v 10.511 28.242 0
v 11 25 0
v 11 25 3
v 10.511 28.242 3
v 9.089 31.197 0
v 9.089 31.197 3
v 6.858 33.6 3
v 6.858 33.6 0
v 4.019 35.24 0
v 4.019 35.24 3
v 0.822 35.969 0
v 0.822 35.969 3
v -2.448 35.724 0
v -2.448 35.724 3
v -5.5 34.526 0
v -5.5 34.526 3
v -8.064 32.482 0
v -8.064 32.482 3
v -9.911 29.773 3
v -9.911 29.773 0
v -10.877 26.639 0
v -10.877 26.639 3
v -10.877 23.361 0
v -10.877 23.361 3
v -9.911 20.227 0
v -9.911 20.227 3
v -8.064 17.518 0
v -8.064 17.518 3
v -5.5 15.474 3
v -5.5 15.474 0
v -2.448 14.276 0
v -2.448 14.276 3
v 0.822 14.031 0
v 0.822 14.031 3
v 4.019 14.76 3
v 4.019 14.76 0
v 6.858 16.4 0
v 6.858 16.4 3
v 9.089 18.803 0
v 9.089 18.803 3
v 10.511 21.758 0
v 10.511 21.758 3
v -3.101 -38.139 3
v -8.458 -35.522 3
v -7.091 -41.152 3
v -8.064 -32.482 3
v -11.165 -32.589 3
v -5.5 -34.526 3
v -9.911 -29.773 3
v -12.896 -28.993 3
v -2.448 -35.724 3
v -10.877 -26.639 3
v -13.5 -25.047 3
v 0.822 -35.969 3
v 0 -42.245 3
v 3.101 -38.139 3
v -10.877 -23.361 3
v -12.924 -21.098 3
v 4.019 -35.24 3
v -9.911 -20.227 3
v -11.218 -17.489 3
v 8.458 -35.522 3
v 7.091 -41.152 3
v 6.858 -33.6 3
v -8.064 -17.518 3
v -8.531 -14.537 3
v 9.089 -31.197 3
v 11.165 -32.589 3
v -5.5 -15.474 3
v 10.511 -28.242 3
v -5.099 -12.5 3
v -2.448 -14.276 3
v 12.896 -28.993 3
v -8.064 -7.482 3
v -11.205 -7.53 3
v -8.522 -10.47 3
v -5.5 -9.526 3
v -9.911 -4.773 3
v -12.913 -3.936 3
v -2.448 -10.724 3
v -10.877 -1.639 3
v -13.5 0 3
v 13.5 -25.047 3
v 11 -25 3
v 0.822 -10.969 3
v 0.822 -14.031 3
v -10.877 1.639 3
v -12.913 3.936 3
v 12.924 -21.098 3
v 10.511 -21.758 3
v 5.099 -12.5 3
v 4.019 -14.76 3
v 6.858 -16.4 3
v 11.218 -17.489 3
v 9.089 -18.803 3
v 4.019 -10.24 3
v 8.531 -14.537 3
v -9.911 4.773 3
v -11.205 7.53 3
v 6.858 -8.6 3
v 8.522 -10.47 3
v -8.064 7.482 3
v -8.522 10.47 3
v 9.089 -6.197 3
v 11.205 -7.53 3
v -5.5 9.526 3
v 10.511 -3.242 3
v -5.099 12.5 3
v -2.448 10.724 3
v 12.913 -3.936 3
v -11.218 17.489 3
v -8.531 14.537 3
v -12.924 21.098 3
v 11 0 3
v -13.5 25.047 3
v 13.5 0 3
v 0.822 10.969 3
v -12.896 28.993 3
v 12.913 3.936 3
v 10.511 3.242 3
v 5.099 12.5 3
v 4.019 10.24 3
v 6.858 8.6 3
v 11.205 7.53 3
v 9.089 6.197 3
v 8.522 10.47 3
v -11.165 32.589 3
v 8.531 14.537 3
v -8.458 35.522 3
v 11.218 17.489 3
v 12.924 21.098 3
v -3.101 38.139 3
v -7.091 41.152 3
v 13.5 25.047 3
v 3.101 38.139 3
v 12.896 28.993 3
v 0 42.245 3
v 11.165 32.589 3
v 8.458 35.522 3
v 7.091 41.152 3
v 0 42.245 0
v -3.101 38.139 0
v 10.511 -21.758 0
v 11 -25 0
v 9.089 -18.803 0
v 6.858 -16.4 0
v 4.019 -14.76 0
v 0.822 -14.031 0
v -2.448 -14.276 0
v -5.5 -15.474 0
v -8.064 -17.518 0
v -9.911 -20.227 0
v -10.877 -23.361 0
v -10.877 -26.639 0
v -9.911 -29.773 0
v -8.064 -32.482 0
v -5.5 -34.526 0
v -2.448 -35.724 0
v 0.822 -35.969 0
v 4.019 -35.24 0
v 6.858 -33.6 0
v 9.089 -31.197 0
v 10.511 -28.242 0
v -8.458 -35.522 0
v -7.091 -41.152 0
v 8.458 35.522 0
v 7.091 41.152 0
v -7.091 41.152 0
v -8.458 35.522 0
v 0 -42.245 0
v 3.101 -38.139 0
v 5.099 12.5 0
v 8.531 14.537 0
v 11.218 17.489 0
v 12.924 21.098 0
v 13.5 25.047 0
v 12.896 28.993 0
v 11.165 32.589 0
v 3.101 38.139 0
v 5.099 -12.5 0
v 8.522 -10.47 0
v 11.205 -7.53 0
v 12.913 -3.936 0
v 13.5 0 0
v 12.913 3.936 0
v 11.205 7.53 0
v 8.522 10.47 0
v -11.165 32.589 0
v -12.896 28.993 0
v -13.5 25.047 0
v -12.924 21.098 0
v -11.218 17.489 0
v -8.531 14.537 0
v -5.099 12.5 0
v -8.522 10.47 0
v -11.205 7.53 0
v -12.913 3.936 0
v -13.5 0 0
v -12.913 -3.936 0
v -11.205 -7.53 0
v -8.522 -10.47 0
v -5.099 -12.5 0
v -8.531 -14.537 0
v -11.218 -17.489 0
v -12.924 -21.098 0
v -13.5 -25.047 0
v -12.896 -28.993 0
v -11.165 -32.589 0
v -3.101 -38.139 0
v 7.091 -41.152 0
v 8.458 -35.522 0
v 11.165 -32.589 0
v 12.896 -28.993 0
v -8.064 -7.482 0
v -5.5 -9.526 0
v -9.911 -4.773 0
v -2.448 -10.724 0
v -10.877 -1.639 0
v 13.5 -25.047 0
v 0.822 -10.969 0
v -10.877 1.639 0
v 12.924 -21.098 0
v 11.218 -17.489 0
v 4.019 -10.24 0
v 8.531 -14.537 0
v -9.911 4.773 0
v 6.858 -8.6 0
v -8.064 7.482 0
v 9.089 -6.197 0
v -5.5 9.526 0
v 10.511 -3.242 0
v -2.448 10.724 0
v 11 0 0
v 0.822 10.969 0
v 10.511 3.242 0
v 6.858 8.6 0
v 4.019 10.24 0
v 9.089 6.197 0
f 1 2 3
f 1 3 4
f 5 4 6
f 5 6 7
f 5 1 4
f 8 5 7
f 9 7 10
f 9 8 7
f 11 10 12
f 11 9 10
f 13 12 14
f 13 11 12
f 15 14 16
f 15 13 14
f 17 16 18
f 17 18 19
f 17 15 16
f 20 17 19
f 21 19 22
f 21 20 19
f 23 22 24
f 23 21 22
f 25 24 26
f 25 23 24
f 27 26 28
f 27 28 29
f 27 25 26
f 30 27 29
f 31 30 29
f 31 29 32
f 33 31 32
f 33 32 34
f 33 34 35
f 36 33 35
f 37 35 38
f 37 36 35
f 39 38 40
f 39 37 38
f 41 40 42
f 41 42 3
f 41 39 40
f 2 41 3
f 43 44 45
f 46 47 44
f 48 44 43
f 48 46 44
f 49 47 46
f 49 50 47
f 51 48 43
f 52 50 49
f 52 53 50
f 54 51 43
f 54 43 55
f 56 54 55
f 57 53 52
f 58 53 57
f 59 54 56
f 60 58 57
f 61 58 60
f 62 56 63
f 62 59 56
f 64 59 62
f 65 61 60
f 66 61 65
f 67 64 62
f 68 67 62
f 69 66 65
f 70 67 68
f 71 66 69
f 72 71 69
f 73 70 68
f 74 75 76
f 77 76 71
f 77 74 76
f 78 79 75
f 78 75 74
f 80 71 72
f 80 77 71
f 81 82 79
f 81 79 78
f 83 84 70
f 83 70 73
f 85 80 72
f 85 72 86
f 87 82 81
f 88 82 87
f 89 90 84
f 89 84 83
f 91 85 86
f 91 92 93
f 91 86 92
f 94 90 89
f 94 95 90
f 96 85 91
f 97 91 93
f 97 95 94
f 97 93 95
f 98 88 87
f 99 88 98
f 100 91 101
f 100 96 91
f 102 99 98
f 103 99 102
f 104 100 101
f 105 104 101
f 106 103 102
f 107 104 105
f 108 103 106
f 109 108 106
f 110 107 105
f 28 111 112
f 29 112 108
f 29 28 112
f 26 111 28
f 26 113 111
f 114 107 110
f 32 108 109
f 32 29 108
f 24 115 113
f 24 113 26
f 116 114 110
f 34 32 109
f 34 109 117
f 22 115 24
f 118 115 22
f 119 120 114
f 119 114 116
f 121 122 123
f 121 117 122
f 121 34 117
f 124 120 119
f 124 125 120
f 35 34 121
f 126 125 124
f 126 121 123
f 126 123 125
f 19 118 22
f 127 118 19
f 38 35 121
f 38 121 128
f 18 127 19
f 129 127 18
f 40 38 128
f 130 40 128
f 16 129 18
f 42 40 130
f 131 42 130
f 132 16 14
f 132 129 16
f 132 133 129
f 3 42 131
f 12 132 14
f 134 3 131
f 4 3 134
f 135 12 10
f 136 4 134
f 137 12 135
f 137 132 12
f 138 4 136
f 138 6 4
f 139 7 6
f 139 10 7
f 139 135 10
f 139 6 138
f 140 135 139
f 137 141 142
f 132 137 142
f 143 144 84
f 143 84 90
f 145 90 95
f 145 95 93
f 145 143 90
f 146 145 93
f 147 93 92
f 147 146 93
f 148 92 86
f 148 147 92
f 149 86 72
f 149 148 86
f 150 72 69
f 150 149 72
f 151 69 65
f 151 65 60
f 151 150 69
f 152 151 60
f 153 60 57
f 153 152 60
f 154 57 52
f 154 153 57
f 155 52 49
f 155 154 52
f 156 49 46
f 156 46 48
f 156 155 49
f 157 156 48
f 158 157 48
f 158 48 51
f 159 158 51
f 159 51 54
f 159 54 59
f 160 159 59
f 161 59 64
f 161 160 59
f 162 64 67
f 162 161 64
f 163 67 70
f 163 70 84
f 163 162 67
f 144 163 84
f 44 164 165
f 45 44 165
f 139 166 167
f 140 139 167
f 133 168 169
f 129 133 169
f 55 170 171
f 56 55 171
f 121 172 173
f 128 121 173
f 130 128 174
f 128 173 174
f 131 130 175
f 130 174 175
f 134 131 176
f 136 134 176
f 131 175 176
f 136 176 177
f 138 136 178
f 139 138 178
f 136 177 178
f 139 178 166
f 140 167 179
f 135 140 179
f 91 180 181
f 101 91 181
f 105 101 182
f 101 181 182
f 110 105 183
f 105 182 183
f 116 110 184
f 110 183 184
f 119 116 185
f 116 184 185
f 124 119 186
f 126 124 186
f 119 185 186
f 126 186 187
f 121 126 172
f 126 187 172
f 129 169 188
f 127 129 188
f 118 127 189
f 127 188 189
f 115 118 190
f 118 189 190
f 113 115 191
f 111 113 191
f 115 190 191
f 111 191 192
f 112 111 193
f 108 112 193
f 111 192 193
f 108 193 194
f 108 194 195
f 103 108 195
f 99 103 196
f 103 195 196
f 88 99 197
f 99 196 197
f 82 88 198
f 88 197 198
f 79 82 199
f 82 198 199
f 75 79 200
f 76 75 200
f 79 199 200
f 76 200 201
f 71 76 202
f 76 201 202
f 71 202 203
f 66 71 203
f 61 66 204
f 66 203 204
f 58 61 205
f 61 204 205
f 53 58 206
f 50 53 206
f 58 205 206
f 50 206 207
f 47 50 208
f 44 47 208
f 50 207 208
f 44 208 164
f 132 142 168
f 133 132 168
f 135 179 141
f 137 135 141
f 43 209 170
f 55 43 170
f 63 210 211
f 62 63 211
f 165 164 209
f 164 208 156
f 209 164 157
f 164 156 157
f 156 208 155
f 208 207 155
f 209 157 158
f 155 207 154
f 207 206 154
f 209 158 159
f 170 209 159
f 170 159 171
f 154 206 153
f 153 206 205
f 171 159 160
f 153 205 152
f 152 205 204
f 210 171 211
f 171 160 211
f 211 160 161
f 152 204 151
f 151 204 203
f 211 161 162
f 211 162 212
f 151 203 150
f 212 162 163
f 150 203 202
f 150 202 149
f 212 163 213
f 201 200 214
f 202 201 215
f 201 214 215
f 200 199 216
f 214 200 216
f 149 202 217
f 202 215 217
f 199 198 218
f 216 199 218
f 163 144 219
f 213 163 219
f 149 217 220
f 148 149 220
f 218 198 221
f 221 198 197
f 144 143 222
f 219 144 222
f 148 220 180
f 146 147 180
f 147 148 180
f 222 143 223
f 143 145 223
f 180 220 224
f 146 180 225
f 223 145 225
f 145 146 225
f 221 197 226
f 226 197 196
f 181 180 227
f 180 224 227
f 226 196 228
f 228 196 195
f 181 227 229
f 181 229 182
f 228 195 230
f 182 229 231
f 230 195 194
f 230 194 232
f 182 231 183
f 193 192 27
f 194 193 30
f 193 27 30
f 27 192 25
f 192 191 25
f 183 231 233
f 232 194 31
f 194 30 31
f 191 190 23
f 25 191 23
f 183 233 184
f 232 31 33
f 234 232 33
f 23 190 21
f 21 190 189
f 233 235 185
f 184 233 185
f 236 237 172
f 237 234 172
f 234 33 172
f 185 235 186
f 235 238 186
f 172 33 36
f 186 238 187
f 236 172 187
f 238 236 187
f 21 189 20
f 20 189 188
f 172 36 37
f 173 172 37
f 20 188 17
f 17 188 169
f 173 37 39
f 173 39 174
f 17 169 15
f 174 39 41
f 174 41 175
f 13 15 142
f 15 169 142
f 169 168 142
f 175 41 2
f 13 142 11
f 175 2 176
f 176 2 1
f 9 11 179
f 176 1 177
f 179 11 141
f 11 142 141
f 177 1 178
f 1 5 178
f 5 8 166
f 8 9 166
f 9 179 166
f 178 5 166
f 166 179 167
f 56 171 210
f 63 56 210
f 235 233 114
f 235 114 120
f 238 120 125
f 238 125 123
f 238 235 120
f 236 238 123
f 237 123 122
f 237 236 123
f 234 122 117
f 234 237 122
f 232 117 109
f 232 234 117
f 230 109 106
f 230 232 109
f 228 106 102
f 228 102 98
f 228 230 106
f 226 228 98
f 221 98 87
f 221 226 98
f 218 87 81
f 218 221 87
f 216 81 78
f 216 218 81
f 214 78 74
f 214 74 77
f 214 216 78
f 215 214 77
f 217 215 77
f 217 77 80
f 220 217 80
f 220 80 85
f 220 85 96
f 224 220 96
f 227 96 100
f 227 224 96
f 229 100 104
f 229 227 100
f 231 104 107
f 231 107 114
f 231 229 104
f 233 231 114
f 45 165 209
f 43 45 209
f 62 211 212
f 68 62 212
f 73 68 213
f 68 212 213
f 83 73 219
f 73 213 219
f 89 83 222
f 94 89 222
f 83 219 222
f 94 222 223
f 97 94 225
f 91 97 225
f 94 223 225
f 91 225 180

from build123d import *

# Parameters (mm, degrees)
F0_R     = 11
F1_DEPTH = 3


with BuildPart() as f1:
    # F0 (on Top) → F1 (new body)
    with BuildSketch(Plane.XY):
        with BuildLine():
            ThreePointArc((8.457802, -35.522148), (13.35858, -23.05107), (5.09902, -12.5))
            ThreePointArc((5.09902, -12.5), (13.5, 0), (5.09902, 12.5))
            ThreePointArc((5.09902, 12.5), (13.35858, 23.05107), (8.457802, 35.522148))
            Line((8.457802, 35.522148), (7.091197, 41.152409))
            Line((7.091197, 41.152409), (3.101335, 38.138939))
            Line((3.101335, 38.138939), (0, 42.245135))
            Line((0, 42.245135), (-3.101335, 38.138939))
            Line((-3.101335, 38.138939), (-7.091197, 41.152409))
            Line((-7.091197, 41.152409), (-8.457802, 35.522148))
            ThreePointArc((-8.457802, 35.522148), (-13.35858, 23.05107), (-5.09902, 12.5))
            ThreePointArc((-5.09902, 12.5), (-13.5, 0), (-5.09902, -12.5))
            ThreePointArc((-5.09902, -12.5), (-13.35858, -23.05107), (-8.457802, -35.522148))
            Line((-8.457802, -35.522148), (-7.091197, -41.152409))
            Line((-7.091197, -41.152409), (-3.101335, -38.138939))
            Line((-3.101335, -38.138939), (0, -42.245135))
            Line((0, -42.245135), (3.101335, -38.138939))
            Line((3.101335, -38.138939), (7.091197, -41.152409))
            Line((7.091197, -41.152409), (8.457802, -35.522148))
        make_face()
        with Locations((0, -25)):
            Circle(F0_R, mode=Mode.SUBTRACT)
        Circle(F0_R, mode=Mode.SUBTRACT)
        with Locations((0, 25)):
            Circle(F0_R, mode=Mode.SUBTRACT)
    extrude(amount=F1_DEPTH)


solid = f1.part
